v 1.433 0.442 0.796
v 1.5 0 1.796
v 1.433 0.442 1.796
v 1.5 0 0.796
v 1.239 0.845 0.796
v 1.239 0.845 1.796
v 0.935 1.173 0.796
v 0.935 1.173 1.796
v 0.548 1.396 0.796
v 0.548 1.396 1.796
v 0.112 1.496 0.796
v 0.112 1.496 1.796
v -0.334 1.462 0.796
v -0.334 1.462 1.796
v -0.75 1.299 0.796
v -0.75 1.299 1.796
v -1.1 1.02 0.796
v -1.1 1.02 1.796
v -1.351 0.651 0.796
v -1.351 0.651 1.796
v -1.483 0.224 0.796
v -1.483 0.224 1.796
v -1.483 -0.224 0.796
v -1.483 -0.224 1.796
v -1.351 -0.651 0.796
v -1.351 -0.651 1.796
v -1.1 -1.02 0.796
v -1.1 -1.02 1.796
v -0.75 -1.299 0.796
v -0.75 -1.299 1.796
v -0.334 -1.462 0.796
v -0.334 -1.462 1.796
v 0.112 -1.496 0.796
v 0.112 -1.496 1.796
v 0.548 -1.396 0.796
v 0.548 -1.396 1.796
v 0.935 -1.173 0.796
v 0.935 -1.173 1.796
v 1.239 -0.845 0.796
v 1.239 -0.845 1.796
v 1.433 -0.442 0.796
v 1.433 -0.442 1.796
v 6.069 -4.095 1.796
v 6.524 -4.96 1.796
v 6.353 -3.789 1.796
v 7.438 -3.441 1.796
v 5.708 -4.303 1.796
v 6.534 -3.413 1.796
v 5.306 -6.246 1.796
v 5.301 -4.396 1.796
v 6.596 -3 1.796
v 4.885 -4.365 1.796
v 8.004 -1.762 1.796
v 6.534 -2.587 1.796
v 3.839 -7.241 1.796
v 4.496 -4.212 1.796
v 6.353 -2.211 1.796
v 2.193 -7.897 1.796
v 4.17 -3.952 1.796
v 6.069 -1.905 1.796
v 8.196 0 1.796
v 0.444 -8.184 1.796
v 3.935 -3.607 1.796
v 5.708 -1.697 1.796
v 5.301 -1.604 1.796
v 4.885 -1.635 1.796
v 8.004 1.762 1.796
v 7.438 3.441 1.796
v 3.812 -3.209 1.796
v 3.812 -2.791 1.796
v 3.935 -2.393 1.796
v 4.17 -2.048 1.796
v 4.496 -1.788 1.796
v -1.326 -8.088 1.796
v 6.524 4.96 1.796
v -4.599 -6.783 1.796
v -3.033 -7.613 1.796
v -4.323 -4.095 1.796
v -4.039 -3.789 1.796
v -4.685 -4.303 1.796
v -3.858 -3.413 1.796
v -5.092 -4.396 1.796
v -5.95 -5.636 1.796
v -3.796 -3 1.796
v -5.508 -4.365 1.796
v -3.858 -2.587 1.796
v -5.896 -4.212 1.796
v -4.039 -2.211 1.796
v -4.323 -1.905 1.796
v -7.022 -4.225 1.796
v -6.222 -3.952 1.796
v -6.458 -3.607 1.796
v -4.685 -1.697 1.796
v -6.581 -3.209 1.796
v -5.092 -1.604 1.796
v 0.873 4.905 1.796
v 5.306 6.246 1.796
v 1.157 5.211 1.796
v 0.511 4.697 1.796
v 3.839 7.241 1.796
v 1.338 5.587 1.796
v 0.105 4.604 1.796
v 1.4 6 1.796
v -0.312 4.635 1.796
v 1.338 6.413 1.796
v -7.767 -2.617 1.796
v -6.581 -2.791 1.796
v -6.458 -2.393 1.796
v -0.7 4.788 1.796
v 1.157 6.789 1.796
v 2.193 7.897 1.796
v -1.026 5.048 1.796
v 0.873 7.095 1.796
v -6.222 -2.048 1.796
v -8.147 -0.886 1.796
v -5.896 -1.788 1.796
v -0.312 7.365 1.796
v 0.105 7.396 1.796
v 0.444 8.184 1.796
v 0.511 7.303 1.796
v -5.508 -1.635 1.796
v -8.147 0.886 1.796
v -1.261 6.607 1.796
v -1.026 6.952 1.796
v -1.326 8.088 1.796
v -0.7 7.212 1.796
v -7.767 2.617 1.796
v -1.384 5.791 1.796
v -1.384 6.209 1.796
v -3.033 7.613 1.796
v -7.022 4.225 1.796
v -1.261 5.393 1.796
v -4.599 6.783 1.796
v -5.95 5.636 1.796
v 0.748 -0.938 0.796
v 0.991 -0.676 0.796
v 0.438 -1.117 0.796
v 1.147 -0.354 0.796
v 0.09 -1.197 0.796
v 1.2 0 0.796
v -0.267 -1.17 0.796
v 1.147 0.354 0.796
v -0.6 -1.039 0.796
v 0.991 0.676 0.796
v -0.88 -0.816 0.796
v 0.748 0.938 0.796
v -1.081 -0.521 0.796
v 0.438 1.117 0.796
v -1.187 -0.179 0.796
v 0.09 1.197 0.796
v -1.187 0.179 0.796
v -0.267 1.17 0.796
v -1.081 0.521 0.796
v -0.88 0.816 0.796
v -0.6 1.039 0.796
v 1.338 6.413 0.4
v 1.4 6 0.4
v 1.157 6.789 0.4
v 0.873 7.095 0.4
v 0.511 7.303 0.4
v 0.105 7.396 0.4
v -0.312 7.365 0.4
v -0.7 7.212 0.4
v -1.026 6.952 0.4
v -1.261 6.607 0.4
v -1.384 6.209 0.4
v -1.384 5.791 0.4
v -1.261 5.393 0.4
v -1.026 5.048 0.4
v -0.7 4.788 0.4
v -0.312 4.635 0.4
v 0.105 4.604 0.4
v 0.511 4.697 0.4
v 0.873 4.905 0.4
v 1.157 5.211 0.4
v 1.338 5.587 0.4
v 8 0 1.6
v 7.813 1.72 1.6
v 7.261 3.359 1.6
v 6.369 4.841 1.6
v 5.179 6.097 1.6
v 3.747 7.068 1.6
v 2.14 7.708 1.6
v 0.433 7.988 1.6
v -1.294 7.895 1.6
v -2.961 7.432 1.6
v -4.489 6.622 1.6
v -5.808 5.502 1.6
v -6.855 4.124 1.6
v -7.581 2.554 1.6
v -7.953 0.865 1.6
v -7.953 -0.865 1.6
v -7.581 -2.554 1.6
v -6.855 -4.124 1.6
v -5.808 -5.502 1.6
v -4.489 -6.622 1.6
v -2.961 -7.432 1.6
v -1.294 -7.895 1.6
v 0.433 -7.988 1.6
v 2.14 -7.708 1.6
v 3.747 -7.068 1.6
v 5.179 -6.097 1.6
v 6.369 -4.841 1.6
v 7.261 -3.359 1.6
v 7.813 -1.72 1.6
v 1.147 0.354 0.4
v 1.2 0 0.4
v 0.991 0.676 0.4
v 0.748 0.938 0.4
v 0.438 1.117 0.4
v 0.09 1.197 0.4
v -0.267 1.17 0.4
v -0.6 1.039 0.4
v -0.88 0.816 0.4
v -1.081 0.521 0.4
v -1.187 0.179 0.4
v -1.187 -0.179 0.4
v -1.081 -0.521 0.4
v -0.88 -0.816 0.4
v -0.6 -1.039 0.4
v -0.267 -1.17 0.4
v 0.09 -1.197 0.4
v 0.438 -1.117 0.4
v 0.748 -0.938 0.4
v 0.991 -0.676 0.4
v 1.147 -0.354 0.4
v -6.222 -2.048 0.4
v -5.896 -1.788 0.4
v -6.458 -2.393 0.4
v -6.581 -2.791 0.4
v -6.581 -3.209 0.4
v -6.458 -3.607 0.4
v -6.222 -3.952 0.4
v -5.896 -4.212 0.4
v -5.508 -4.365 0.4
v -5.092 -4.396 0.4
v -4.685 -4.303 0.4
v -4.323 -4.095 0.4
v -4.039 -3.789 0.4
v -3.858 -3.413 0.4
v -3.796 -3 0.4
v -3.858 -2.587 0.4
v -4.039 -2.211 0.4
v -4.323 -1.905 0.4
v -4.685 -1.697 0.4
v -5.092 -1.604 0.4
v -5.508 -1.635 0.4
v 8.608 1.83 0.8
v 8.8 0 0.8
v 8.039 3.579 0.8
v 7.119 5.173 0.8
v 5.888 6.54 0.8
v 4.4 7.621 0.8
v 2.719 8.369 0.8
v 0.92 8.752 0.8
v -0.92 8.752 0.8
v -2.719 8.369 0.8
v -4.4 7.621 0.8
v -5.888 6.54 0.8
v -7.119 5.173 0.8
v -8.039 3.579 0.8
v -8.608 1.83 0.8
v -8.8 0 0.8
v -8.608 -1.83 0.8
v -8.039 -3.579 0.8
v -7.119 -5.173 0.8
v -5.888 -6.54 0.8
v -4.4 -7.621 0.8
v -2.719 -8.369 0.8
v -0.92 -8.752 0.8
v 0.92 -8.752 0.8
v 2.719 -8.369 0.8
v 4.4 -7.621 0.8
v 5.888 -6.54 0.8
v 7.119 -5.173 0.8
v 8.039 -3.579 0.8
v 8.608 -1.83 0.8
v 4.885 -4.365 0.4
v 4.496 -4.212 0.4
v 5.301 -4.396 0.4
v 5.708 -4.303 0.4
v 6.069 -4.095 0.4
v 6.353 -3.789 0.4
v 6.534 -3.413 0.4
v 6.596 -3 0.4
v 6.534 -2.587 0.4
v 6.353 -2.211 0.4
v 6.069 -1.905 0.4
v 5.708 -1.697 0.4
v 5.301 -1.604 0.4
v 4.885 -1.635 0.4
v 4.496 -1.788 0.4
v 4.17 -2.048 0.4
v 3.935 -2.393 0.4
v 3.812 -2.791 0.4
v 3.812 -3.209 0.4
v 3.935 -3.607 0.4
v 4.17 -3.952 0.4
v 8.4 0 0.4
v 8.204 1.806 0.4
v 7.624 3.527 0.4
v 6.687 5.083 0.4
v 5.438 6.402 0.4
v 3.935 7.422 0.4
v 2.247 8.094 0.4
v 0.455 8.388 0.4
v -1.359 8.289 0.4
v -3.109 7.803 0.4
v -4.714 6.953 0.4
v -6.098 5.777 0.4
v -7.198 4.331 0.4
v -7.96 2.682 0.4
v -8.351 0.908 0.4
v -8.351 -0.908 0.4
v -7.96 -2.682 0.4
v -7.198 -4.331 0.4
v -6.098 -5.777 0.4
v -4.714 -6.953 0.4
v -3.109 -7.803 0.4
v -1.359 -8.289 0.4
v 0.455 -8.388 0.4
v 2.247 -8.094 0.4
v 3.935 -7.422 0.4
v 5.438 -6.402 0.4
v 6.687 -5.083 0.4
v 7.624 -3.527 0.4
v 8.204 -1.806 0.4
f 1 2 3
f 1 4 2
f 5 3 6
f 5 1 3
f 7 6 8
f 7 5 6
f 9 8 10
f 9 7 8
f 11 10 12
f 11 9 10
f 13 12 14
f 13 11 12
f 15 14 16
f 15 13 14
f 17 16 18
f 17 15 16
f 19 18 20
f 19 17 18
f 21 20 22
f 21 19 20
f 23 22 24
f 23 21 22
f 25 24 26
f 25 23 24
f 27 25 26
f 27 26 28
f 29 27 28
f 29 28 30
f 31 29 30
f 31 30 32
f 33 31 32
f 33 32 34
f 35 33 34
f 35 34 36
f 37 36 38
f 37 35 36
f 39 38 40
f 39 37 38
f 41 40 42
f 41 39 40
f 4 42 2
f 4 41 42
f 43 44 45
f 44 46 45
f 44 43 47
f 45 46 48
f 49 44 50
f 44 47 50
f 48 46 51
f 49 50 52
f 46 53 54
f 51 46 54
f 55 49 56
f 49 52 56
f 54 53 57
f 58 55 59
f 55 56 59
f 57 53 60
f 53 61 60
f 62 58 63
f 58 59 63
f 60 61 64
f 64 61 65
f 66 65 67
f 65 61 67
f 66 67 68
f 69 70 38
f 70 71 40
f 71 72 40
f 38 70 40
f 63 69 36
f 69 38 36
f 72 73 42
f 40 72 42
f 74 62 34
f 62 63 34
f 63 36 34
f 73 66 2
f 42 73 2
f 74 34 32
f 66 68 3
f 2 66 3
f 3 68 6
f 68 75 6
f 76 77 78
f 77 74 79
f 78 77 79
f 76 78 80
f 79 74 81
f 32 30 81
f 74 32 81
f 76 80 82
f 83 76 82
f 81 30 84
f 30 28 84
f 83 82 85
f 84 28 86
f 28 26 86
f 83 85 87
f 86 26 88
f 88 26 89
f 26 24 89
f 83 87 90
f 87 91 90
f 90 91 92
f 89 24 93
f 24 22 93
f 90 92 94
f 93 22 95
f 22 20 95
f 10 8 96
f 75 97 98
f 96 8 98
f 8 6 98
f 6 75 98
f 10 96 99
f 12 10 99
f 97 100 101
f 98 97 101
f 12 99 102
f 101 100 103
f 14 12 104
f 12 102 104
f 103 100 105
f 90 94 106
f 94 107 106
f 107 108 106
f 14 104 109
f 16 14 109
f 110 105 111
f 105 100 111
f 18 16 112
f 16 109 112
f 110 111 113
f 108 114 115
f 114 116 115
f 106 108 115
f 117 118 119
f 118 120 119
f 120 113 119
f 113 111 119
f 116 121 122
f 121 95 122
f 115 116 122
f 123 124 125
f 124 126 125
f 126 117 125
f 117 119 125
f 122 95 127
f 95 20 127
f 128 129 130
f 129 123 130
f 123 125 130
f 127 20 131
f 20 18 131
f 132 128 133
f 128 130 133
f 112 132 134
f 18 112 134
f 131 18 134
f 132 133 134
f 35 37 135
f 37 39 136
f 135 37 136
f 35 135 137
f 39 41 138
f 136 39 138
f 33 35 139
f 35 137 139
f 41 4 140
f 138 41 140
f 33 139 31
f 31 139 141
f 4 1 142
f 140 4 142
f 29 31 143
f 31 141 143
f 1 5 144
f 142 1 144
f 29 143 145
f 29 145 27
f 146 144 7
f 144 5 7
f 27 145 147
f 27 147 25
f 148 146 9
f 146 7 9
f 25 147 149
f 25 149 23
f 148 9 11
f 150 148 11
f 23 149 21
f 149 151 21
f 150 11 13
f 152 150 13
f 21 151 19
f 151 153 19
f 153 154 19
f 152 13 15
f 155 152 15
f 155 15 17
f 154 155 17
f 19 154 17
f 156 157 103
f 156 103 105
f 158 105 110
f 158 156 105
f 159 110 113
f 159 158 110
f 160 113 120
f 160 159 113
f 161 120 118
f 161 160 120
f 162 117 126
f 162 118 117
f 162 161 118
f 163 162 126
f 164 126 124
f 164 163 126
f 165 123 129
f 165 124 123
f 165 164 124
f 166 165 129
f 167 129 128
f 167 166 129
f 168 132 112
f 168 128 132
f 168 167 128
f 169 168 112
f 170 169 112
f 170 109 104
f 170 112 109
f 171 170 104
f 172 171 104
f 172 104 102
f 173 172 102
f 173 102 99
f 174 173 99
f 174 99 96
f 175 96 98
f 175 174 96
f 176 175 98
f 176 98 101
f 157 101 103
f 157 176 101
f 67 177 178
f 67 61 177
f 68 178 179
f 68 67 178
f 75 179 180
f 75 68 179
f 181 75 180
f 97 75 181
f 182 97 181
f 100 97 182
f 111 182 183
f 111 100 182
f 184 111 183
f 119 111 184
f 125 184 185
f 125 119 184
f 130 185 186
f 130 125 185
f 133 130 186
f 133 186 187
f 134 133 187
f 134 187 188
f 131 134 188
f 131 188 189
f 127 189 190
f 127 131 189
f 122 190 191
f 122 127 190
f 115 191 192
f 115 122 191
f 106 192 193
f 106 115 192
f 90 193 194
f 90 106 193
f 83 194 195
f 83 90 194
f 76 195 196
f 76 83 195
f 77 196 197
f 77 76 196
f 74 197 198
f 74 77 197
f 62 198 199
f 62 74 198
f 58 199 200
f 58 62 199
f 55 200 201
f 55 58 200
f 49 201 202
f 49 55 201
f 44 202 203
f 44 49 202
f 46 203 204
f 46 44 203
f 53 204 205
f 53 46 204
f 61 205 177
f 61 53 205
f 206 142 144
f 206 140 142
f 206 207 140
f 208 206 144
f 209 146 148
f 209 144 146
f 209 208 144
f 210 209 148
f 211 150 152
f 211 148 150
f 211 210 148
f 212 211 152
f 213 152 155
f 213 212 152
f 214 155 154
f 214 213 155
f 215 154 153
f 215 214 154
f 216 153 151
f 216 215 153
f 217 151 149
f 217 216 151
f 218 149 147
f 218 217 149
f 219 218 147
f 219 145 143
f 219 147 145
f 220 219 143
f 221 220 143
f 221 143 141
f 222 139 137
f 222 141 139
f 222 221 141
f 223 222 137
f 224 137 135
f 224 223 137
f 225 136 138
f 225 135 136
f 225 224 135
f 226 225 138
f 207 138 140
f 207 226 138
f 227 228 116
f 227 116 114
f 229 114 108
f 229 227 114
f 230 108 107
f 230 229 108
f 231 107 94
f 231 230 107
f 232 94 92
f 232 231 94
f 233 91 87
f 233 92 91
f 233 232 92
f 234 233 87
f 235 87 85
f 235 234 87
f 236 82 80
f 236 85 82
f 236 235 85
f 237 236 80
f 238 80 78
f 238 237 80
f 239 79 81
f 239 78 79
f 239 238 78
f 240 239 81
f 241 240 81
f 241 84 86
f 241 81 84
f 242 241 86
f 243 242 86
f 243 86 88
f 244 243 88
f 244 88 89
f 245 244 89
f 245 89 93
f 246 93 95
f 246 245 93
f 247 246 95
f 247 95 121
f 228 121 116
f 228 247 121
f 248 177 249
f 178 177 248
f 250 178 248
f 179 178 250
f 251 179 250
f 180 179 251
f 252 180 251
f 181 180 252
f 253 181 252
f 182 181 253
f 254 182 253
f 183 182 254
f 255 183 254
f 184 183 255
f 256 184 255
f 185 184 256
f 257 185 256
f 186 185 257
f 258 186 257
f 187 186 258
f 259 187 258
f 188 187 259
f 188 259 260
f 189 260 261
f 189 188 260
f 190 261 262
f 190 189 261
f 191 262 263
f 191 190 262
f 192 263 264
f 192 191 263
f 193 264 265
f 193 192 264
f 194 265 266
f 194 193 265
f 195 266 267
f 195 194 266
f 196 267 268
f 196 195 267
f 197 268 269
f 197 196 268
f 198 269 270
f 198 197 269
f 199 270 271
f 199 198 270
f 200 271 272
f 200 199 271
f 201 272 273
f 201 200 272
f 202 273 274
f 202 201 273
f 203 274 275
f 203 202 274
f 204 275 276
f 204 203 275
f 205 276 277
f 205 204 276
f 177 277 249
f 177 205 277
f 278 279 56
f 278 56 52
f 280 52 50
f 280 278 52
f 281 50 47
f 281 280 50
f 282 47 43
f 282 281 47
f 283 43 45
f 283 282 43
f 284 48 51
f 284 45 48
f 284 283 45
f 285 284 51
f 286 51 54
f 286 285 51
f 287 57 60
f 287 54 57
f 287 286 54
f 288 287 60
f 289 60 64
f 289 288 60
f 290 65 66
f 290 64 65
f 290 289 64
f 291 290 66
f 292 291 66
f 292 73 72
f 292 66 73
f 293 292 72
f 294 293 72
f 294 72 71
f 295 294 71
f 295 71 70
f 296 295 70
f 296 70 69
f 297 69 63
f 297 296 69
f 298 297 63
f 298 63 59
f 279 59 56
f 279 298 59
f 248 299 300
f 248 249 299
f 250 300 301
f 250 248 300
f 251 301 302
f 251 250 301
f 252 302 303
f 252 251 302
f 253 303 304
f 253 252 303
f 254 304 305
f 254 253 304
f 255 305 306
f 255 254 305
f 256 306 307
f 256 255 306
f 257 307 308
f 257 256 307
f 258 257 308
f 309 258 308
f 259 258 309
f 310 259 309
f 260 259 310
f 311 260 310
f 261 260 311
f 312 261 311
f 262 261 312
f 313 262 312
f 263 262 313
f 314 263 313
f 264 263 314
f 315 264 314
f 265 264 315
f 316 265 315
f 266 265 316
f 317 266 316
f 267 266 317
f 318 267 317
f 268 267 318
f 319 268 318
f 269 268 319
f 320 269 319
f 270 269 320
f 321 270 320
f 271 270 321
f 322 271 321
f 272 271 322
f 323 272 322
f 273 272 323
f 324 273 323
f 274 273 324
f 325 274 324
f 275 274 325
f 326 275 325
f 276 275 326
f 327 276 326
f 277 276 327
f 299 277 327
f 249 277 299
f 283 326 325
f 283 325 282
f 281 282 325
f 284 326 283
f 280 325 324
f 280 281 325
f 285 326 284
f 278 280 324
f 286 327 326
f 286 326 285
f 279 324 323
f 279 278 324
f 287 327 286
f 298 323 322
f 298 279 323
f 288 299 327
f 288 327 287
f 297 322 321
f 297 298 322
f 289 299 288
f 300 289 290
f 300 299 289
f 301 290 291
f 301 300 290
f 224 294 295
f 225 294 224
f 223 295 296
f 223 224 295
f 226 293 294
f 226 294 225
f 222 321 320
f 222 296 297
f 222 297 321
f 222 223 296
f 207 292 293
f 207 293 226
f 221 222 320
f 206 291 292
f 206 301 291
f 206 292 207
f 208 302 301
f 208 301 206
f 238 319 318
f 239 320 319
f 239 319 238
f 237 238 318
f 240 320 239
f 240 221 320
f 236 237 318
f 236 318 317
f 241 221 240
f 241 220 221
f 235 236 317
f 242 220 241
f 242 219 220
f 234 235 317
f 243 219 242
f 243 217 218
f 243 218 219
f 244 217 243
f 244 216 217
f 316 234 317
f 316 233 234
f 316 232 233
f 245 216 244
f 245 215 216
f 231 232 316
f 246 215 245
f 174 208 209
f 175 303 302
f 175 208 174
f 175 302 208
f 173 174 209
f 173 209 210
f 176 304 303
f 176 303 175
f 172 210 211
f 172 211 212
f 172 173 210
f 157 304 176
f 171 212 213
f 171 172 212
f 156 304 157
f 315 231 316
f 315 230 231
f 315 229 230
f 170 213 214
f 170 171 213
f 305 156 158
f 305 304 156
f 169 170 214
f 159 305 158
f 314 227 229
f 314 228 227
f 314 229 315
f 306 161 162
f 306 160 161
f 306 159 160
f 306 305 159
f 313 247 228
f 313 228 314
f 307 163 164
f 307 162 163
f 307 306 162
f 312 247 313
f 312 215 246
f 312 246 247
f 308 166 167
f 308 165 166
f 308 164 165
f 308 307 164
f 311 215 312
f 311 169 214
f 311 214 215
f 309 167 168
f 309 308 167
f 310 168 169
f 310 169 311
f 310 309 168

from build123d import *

# Parameters (mm, degrees)
CYLINDER_R     = 1.4
CYLINDER_DEPTH = 10
ARRAY001_COUNT = 3
SKETCH018_W    = 3.15
SKETCH018_H    = 2.3
SKETCH002_W    = 5
SKETCH002_H    = 6.8
ARRAY_Z_COUNT  = 6
ARRAY_Z_PITCH  = 1.6
SKETCH005_W    = 10
SKETCH005_H    = 2.2955317108


with BuildPart() as boltholes:
    # Cylinder → Cylinder (new body)
    with BuildSketch(Plane(origin=(0, 6, -1), x_dir=(1, 0, 0), z_dir=(0, 0, 1))):
        Circle(CYLINDER_R)
    extrude(amount=CYLINDER_DEPTH)

    # Array001: BoltHoles ×3 about axis
    array001_axis = Axis((0, 0, 0), (0, 0, 1))


with BuildPart() as boltholes_1:
    add(boltholes.part)
    for i in range(1, ARRAY001_COUNT):
        add(boltholes.part.rotate(array001_axis, i * 360 / ARRAY001_COUNT))


with BuildPart() as ps2long001:
    # Sketch018 → Revolution007 (revolve)
    with BuildSketch(Plane.XZ):
        with Locations((1.575, 5.7267413876)):
            Rectangle(SKETCH018_W, SKETCH018_H)
    revolve(axis=Axis((0, 0, 0), (0, 0, 1)))


with BuildPart() as clone_of_laq:
    # Sketch007 → Revolution006 (revolve)
    with BuildSketch(Plane.XZ):
        with BuildLine():
            ThreePointArc((1.5, 1.7955317108), (0.867020761, 2.4322916436), (0, 2.6655317108))
            Line((0, 2.6655317108), (0, 0.7955317108))
            Line((0, 0.7955317108), (1.5, 0.7955317108))
            Line((1.5, 1.7955317108), (1.5, 0.7955317108))
        make_face()
    revolve(axis=Axis((0, 0, 0), (0, 0, 1)))


with BuildPart() as innergroovedom001:
    # Sketch002 → Revolution002 (revolve)
    with BuildSketch(Plane.XZ):
        with Locations((7.5, 3.8)):
            Rectangle(SKETCH002_W, SKETCH002_H)
    revolve(axis=Axis((0, 0, 0), (0, 0, 1)))


with BuildPart() as innergroovetool:
    # Sketch001 → Revolution001 (revolve)
    with BuildSketch(Plane.XZ):
        Polygon((4, 8), (4, 6.4), (8, 6.4), (8.8, 7.2), (8, 8), align=None)
    revolve(axis=Axis((0, 0, 0), (0, 0, 1)))

    # Array Z: InnerGrooveTool ×6


with BuildPart() as innergroovetool_1:
    add(innergroovetool.part)
    with Locations(*[(0, 0, -i * ARRAY_Z_PITCH) for i in range(1, ARRAY_Z_COUNT)]):
        add(innergroovetool.part)

    # Common: intersect InnerGrooveDom001
    add(innergroovedom001.part, mode=Mode.INTERSECT)


with BuildPart() as clone_of_boltholes001:
    # Sketch → Revolution (revolve)
    with BuildSketch(Plane.XZ):
        Polygon((1.2, 0.4), (8, 0.4), (8, 7.2), (2.8, 7.2), (1.2, 2.2), align=None)
    revolve(axis=Axis((0, 0, 0), (0, 0, 1)))

    # Fusion001: union InnerGrooveTool
    add(innergroovetool_1.part)

    # Cut: cut Clone of LAQ
    add(clone_of_laq.part, mode=Mode.SUBTRACT)

    # Cut003: cut PS2Long001
    add(ps2long001.part, mode=Mode.SUBTRACT)

    # Cut001: cut BoltHoles
    add(boltholes_1.part, mode=Mode.SUBTRACT)


with BuildPart() as laq0202nlaq0617lower:
    # Sketch005 → Revolution004 (revolve)
    with BuildSketch(Plane.XZ):
        with Locations((5, 0.6477658554)):
            Rectangle(SKETCH005_W, SKETCH005_H)
    revolve(axis=Axis((0, 0, 0), (0, 0, 1)))

    # Common001: intersect Clone of BoltHoles001
    add(clone_of_boltholes001.part, mode=Mode.INTERSECT)


solid = laq0202nlaq0617lower.part
